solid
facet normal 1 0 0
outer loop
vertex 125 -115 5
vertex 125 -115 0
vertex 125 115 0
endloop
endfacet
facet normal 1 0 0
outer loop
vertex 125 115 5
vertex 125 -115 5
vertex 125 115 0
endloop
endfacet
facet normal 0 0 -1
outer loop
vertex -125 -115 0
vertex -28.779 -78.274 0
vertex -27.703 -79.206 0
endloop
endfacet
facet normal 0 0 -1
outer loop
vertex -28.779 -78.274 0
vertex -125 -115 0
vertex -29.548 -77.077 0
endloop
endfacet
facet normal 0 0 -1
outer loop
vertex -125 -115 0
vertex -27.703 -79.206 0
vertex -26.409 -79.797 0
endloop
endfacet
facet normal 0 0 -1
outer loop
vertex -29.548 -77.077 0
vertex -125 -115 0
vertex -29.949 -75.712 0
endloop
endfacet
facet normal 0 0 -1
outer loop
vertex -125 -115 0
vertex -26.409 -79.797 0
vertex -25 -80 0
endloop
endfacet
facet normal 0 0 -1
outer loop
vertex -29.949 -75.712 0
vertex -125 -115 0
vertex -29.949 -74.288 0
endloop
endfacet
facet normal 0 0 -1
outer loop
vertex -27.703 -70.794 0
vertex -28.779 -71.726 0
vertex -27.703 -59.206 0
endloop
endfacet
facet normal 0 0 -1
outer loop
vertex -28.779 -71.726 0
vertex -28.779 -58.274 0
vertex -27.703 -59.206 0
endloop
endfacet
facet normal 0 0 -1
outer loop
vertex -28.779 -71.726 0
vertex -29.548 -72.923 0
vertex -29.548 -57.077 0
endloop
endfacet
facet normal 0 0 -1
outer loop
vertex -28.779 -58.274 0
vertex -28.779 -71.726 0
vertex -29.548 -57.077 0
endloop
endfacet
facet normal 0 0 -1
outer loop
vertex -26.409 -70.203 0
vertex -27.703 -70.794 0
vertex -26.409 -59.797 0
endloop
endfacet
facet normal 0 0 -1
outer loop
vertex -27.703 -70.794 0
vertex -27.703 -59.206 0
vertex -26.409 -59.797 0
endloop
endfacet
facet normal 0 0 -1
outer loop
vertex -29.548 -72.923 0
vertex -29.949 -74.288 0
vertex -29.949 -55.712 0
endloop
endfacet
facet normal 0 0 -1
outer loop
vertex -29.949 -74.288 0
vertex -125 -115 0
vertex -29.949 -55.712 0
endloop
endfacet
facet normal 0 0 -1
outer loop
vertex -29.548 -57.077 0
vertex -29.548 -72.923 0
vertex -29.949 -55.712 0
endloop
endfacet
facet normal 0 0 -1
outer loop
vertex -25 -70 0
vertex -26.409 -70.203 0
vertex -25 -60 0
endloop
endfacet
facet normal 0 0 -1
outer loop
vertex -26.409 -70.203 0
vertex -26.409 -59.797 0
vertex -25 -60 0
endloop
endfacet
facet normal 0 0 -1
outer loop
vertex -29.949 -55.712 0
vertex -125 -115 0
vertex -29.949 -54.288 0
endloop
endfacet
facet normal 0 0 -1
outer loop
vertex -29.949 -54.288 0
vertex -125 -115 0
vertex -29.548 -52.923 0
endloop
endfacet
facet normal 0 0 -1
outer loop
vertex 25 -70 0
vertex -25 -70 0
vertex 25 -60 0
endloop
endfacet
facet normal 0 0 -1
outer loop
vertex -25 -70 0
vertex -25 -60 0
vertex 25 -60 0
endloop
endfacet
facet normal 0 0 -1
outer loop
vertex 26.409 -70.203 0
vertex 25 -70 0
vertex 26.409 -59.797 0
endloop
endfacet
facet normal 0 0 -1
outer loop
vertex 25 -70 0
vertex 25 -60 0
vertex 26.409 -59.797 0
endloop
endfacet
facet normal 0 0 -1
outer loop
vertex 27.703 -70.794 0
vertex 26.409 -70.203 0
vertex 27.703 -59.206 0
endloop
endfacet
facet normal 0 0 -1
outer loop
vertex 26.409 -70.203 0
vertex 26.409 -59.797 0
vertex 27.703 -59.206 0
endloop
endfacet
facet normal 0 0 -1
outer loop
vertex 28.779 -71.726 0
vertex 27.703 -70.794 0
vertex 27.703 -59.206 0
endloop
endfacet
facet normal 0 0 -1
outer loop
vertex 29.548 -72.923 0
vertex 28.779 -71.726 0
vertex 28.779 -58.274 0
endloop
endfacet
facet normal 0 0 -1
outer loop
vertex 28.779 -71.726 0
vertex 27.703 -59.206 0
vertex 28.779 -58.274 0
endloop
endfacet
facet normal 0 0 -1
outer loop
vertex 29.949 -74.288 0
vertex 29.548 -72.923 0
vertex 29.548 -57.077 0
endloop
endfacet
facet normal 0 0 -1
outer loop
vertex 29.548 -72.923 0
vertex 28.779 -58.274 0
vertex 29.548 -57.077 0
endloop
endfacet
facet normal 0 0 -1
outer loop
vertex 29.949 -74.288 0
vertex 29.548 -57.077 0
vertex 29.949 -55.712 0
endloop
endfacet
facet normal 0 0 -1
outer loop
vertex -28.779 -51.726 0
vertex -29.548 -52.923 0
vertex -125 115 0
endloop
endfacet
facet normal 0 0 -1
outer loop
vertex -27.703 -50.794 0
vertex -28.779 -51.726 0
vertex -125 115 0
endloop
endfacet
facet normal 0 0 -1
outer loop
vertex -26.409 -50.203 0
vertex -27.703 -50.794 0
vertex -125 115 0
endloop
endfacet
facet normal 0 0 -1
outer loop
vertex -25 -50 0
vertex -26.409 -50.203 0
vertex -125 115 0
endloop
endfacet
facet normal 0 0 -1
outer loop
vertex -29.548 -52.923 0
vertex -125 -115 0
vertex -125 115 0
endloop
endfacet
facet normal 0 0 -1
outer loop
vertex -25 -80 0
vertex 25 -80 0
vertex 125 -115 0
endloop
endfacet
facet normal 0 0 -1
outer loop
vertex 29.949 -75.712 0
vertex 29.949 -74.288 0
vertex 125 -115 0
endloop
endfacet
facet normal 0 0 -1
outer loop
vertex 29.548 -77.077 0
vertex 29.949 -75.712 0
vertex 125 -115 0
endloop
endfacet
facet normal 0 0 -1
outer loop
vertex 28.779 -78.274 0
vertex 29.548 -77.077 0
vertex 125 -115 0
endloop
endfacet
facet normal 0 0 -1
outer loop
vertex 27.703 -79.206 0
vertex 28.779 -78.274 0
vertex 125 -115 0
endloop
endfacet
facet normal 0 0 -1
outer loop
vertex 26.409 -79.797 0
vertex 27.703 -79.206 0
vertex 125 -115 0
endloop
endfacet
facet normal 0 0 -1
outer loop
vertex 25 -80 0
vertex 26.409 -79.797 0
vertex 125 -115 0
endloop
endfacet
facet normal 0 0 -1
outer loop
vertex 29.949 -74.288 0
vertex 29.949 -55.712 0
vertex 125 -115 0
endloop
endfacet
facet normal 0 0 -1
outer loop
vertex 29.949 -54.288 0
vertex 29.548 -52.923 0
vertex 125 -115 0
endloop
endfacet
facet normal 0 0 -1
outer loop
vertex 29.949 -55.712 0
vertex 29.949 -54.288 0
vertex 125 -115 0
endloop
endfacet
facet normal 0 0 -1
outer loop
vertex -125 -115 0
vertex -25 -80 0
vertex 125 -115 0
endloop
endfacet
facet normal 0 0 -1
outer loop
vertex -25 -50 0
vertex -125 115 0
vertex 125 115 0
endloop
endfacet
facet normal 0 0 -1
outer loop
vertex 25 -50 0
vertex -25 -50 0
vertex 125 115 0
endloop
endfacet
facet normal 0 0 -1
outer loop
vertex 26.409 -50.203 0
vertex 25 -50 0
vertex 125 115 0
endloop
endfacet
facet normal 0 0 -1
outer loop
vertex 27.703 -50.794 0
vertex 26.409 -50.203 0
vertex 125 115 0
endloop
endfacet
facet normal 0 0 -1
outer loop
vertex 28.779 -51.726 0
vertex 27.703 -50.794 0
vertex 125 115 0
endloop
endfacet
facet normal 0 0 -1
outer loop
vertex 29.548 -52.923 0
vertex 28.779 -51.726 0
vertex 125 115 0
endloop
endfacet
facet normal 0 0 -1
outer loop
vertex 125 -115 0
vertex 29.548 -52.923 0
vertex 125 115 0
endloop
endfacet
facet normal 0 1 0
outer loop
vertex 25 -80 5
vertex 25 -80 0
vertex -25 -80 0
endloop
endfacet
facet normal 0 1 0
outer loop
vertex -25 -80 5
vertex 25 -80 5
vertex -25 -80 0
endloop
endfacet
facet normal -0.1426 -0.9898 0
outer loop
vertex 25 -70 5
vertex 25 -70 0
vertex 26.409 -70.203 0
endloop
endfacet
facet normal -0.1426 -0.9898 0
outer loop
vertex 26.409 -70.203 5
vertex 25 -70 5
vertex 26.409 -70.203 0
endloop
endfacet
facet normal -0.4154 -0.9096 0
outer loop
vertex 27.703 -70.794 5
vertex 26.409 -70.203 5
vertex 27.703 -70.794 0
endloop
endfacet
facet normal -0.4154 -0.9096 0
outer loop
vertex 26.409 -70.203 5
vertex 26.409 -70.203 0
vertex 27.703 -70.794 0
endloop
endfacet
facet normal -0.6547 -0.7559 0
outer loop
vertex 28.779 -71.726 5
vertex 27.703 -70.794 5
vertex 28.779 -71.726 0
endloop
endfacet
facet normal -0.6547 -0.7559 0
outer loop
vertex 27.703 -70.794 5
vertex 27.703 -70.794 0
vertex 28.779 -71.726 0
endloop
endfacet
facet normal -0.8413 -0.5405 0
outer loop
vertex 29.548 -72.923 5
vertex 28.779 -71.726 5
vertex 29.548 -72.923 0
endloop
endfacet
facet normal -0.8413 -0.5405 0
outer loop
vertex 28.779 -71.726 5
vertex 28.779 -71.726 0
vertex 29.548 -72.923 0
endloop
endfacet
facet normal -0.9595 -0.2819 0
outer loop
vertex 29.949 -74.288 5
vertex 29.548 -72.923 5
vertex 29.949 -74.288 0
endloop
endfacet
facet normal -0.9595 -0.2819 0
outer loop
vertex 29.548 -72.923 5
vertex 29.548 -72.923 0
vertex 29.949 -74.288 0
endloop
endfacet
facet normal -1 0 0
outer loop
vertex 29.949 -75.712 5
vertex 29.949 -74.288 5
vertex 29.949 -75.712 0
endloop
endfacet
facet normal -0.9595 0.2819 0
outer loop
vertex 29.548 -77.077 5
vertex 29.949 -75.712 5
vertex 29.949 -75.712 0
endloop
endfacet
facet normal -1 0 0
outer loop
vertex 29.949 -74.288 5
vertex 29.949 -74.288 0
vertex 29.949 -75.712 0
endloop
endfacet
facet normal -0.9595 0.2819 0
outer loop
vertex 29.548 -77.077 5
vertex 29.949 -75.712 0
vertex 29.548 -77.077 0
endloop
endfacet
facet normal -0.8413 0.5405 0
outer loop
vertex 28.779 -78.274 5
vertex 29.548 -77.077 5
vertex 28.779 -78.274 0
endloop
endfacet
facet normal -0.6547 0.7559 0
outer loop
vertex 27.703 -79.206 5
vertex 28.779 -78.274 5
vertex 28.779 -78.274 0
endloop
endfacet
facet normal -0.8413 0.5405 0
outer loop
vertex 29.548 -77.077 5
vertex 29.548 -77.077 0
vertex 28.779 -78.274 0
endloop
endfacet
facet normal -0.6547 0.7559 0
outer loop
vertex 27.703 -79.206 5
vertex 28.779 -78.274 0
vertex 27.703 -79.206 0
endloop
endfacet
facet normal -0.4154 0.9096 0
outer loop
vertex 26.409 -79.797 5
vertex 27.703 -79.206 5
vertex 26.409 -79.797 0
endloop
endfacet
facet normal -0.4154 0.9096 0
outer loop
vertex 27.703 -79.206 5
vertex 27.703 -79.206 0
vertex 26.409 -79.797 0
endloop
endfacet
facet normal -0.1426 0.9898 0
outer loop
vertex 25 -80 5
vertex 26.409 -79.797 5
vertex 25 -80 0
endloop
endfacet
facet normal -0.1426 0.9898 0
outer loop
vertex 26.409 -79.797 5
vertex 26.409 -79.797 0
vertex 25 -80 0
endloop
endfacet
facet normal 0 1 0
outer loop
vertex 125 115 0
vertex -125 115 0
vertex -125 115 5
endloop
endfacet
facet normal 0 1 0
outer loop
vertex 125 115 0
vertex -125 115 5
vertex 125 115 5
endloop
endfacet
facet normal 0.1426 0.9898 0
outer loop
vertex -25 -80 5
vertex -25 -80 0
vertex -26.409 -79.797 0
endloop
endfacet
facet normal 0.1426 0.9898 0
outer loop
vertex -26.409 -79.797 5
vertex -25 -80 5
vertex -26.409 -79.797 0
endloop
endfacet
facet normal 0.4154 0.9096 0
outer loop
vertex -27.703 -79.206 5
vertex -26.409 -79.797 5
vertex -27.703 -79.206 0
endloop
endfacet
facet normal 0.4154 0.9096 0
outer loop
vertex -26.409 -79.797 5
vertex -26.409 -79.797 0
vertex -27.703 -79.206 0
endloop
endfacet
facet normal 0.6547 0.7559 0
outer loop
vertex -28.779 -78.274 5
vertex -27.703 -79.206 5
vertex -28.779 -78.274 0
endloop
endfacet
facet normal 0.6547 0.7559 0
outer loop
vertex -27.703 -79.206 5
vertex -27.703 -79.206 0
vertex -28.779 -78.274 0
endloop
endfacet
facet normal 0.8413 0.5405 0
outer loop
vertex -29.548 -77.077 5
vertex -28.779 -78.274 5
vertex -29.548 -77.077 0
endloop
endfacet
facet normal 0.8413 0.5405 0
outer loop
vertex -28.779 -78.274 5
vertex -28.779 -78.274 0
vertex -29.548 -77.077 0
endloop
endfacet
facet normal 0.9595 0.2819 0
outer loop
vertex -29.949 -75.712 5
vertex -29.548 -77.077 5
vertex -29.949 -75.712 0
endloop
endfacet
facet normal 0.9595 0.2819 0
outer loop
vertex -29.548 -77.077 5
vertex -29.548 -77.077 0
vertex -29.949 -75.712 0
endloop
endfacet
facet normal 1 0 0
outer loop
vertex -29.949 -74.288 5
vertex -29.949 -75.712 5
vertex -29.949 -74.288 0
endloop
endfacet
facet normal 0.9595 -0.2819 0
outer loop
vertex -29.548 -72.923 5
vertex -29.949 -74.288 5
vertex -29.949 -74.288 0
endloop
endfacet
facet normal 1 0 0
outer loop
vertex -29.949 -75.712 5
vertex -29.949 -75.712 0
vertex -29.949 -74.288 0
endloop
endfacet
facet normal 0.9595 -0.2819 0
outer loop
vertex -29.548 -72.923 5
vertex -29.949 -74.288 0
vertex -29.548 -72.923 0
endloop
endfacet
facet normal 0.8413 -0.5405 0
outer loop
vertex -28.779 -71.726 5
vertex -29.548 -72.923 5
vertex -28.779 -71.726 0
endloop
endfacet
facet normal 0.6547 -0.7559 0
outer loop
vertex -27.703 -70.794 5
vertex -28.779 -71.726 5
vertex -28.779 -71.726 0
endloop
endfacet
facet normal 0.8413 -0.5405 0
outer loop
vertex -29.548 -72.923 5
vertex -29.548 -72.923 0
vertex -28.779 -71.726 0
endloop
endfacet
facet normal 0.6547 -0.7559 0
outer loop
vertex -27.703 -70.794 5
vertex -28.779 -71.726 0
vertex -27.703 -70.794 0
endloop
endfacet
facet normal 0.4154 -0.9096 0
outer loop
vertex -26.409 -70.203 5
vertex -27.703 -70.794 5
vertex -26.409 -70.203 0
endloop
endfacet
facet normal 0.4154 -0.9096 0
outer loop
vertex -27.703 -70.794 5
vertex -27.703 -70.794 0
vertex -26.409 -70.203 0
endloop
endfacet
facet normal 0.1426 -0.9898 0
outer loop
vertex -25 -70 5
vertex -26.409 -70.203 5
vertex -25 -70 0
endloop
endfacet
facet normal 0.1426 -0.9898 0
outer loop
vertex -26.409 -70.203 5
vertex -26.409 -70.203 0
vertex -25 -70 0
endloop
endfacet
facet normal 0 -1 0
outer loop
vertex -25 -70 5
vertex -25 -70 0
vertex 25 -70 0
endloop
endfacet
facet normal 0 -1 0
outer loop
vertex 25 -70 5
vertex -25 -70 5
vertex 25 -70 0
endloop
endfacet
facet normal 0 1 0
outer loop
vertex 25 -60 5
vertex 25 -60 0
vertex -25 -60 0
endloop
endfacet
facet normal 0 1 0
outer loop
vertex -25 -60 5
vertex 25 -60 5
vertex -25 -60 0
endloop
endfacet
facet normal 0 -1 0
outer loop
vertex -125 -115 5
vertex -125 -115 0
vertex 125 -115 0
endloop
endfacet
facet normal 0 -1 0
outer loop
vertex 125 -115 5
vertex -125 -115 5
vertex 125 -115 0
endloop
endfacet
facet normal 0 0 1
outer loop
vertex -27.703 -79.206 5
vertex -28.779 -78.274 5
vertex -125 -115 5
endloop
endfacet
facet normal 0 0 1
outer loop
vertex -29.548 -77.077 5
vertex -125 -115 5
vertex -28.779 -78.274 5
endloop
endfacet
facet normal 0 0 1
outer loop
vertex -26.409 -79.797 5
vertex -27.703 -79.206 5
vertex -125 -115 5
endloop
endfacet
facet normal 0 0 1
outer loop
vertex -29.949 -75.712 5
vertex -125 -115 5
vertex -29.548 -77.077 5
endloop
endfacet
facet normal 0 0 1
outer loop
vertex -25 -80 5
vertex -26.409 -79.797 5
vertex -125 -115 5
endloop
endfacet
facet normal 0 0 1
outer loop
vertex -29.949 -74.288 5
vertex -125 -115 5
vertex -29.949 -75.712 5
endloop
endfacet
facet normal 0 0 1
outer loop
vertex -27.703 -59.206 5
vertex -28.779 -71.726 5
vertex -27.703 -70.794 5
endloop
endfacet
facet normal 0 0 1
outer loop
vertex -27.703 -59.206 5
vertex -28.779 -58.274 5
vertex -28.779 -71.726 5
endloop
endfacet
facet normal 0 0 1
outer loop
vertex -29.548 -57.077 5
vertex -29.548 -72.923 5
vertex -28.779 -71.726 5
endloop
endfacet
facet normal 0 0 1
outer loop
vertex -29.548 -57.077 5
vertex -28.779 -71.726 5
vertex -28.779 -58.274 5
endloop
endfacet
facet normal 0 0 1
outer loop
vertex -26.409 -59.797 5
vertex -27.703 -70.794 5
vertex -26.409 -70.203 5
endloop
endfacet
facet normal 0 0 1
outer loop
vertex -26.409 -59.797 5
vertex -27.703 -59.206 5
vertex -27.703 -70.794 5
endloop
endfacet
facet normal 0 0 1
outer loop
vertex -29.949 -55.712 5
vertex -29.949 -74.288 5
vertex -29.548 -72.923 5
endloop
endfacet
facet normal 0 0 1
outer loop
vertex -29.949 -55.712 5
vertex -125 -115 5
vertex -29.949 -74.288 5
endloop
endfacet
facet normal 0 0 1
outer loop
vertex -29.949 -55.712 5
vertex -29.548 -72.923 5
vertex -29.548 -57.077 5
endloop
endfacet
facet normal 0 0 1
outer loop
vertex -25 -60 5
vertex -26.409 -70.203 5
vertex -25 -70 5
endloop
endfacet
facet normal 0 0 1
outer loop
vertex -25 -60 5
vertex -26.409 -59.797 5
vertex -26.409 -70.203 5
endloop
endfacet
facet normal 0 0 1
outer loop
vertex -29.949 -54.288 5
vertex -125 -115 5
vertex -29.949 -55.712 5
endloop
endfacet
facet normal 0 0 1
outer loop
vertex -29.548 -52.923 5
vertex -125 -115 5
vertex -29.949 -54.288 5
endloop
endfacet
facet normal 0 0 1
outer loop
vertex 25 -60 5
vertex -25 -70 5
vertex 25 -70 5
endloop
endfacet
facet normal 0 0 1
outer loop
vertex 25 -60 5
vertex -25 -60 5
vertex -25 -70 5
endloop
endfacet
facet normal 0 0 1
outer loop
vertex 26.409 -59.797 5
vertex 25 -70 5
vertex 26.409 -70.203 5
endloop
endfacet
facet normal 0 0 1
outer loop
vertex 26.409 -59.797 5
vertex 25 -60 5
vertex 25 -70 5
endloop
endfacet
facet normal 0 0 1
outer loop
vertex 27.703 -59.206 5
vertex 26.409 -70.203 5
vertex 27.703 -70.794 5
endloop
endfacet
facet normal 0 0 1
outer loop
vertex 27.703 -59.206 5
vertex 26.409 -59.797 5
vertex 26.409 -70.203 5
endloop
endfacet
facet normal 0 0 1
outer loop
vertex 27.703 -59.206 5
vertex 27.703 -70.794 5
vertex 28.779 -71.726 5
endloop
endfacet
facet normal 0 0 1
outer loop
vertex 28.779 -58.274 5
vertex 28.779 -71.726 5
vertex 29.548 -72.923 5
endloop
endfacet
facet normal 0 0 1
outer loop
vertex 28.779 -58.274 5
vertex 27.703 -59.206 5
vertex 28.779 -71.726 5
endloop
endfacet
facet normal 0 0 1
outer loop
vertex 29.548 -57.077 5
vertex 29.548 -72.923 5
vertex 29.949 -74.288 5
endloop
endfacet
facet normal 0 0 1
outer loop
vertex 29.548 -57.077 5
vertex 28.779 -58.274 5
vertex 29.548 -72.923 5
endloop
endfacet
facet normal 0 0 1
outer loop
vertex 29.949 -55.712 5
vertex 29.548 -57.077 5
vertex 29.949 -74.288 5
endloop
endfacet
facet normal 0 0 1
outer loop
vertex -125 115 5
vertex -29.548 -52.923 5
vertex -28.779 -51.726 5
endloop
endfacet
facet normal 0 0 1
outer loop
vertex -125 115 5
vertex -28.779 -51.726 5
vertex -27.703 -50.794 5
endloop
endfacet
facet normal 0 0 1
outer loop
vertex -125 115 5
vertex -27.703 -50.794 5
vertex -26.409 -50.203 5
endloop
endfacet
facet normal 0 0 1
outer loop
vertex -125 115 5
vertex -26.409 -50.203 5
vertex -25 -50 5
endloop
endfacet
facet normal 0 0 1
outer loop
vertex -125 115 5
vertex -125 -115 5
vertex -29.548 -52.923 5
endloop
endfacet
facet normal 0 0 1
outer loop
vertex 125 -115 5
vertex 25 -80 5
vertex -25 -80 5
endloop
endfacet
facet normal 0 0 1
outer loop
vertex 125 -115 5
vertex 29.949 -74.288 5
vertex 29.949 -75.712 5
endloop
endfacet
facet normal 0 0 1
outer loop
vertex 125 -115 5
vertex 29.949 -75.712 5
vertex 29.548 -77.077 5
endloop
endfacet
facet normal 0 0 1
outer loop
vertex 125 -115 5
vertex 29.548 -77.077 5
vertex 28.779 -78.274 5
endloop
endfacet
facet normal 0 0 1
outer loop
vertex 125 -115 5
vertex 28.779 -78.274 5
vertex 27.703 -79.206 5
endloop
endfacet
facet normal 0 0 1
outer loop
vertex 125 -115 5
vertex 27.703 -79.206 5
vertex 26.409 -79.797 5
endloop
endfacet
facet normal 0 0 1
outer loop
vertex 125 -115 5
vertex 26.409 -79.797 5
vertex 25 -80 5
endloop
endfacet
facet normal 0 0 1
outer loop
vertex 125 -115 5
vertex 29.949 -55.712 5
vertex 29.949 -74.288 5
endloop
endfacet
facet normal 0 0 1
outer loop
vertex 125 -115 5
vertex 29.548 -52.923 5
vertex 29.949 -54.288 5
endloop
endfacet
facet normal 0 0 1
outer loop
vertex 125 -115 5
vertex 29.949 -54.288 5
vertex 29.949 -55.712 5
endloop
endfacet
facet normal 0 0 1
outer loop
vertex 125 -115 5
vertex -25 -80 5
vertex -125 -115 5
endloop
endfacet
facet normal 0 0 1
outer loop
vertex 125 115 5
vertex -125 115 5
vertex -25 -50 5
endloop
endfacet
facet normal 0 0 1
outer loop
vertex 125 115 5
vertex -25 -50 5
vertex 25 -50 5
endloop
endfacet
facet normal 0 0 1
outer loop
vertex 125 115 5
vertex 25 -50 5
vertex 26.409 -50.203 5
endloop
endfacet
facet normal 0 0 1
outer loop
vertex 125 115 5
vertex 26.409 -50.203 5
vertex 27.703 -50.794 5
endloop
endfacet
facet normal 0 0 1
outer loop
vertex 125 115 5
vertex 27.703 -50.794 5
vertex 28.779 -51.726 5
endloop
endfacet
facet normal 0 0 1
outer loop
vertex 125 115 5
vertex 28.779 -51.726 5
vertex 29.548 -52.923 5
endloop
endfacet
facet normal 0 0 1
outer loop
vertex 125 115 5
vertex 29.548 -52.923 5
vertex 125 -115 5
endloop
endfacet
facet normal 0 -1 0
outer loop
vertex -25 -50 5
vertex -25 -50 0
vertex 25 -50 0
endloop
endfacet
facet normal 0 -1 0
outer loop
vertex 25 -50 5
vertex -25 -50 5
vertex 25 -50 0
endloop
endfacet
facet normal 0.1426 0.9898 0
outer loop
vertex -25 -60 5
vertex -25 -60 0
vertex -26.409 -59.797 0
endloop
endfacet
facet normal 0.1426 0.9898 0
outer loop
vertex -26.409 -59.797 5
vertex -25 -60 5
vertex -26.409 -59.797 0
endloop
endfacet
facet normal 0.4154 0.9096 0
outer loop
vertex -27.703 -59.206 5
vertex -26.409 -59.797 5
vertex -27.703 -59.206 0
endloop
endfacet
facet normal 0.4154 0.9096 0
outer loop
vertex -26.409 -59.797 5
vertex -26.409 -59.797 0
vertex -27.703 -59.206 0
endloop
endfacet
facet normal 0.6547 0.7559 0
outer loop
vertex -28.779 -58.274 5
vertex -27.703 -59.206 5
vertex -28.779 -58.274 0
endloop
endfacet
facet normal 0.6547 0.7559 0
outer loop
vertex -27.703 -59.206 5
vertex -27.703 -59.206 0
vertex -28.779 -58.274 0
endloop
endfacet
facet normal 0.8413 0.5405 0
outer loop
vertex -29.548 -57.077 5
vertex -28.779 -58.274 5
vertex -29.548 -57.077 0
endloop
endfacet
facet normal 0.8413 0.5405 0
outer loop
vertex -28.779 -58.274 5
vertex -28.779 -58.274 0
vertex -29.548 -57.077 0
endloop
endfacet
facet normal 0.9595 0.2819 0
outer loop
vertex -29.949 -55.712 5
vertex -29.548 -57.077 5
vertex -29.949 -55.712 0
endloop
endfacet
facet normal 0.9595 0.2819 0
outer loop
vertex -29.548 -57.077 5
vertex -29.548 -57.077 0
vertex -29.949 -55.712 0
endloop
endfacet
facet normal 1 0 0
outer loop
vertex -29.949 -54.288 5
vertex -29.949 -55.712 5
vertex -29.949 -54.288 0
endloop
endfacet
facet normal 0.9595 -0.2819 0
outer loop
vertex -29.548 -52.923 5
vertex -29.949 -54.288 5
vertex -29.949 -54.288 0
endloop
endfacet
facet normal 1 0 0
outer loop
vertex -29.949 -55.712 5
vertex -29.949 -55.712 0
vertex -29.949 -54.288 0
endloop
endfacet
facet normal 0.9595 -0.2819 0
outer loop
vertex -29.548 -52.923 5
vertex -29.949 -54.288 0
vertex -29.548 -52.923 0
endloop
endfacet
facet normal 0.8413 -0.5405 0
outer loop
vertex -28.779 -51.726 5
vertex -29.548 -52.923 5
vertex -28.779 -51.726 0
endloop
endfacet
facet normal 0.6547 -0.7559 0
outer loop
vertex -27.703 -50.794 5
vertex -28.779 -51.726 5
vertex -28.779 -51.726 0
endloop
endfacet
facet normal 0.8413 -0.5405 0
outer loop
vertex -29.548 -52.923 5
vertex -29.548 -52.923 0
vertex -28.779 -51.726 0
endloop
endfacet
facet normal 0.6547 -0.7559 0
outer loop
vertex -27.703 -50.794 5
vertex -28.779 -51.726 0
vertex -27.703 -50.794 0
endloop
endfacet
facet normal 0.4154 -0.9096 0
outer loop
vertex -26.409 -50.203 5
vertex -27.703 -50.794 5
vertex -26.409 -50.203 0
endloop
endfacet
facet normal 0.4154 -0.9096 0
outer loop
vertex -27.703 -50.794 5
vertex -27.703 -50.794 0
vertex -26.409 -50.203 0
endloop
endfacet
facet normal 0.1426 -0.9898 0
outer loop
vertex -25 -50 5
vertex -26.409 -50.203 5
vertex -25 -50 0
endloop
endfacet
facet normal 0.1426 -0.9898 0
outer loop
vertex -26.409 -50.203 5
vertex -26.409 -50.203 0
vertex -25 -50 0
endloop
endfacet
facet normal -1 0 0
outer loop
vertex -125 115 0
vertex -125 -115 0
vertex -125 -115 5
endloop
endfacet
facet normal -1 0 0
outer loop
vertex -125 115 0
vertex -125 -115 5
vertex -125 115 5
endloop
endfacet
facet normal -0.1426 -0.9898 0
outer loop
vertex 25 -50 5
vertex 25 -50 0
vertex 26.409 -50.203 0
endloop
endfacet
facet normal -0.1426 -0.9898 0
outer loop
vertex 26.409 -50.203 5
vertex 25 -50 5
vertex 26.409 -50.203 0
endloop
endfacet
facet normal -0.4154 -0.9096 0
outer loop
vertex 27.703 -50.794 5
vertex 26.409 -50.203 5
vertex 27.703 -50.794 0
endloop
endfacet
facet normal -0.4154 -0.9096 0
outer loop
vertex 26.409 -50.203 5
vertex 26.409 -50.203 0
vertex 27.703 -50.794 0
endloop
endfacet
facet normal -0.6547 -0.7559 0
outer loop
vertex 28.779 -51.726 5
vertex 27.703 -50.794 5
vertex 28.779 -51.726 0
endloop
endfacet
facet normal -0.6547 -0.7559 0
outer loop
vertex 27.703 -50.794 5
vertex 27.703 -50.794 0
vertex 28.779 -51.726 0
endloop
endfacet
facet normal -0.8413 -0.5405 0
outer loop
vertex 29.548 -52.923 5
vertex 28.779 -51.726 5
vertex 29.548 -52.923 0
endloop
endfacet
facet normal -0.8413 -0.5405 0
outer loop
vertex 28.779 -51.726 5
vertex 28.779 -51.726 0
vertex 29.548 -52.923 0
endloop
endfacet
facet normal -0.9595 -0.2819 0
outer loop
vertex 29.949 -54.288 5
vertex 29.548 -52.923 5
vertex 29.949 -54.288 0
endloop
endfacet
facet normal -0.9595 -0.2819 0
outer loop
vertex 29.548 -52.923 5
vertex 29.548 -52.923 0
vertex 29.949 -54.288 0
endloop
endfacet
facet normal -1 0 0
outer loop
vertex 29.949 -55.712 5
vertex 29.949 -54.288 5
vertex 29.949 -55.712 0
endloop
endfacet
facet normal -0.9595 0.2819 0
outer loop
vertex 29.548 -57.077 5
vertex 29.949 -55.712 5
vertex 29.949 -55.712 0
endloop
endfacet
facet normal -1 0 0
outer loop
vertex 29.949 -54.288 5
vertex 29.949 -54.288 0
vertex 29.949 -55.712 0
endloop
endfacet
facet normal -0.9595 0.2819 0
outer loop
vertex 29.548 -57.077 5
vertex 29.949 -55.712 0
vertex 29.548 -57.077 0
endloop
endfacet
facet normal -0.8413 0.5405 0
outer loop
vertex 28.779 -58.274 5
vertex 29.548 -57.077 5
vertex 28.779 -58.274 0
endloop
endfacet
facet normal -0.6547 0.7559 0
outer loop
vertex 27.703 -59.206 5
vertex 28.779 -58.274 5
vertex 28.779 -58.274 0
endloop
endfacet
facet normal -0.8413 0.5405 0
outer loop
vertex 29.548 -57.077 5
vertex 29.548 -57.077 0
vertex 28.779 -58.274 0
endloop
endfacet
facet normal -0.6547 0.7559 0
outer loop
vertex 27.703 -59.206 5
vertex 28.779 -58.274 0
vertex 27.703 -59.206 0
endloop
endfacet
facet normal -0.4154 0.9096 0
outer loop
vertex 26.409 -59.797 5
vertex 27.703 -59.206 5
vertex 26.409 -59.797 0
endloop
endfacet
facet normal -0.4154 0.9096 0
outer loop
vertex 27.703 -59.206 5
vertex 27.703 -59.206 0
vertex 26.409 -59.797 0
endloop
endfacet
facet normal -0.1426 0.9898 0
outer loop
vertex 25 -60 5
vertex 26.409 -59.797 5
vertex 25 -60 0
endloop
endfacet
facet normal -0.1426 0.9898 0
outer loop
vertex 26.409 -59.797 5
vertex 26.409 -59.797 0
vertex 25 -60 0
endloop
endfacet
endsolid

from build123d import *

# Parameters (mm, degrees)
F0_W     = 250
F0_H     = 230
F1_DEPTH = 5


with BuildPart() as f1:
    # F0 (on Top) → F1 (new body)
    with BuildSketch(Plane.XY):
        Rectangle(F0_W, F0_H)
        with BuildLine():
            ThreePointArc((-25, -80), (-30, -75), (-25, -70))
            Line((-25, -70), (25, -70))
            ThreePointArc((25, -70), (30, -75), (25, -80))
            Line((25, -80), (-25, -80))
        make_face(mode=Mode.SUBTRACT)
        with BuildLine():
            ThreePointArc((-25, -60), (-30, -55), (-25, -50))
            Line((-25, -50), (25, -50))
            ThreePointArc((25, -50), (30, -55), (25, -60))
            Line((25, -60), (-25, -60))
        make_face(mode=Mode.SUBTRACT)
    extrude(amount=F1_DEPTH)


solid = f1.part
